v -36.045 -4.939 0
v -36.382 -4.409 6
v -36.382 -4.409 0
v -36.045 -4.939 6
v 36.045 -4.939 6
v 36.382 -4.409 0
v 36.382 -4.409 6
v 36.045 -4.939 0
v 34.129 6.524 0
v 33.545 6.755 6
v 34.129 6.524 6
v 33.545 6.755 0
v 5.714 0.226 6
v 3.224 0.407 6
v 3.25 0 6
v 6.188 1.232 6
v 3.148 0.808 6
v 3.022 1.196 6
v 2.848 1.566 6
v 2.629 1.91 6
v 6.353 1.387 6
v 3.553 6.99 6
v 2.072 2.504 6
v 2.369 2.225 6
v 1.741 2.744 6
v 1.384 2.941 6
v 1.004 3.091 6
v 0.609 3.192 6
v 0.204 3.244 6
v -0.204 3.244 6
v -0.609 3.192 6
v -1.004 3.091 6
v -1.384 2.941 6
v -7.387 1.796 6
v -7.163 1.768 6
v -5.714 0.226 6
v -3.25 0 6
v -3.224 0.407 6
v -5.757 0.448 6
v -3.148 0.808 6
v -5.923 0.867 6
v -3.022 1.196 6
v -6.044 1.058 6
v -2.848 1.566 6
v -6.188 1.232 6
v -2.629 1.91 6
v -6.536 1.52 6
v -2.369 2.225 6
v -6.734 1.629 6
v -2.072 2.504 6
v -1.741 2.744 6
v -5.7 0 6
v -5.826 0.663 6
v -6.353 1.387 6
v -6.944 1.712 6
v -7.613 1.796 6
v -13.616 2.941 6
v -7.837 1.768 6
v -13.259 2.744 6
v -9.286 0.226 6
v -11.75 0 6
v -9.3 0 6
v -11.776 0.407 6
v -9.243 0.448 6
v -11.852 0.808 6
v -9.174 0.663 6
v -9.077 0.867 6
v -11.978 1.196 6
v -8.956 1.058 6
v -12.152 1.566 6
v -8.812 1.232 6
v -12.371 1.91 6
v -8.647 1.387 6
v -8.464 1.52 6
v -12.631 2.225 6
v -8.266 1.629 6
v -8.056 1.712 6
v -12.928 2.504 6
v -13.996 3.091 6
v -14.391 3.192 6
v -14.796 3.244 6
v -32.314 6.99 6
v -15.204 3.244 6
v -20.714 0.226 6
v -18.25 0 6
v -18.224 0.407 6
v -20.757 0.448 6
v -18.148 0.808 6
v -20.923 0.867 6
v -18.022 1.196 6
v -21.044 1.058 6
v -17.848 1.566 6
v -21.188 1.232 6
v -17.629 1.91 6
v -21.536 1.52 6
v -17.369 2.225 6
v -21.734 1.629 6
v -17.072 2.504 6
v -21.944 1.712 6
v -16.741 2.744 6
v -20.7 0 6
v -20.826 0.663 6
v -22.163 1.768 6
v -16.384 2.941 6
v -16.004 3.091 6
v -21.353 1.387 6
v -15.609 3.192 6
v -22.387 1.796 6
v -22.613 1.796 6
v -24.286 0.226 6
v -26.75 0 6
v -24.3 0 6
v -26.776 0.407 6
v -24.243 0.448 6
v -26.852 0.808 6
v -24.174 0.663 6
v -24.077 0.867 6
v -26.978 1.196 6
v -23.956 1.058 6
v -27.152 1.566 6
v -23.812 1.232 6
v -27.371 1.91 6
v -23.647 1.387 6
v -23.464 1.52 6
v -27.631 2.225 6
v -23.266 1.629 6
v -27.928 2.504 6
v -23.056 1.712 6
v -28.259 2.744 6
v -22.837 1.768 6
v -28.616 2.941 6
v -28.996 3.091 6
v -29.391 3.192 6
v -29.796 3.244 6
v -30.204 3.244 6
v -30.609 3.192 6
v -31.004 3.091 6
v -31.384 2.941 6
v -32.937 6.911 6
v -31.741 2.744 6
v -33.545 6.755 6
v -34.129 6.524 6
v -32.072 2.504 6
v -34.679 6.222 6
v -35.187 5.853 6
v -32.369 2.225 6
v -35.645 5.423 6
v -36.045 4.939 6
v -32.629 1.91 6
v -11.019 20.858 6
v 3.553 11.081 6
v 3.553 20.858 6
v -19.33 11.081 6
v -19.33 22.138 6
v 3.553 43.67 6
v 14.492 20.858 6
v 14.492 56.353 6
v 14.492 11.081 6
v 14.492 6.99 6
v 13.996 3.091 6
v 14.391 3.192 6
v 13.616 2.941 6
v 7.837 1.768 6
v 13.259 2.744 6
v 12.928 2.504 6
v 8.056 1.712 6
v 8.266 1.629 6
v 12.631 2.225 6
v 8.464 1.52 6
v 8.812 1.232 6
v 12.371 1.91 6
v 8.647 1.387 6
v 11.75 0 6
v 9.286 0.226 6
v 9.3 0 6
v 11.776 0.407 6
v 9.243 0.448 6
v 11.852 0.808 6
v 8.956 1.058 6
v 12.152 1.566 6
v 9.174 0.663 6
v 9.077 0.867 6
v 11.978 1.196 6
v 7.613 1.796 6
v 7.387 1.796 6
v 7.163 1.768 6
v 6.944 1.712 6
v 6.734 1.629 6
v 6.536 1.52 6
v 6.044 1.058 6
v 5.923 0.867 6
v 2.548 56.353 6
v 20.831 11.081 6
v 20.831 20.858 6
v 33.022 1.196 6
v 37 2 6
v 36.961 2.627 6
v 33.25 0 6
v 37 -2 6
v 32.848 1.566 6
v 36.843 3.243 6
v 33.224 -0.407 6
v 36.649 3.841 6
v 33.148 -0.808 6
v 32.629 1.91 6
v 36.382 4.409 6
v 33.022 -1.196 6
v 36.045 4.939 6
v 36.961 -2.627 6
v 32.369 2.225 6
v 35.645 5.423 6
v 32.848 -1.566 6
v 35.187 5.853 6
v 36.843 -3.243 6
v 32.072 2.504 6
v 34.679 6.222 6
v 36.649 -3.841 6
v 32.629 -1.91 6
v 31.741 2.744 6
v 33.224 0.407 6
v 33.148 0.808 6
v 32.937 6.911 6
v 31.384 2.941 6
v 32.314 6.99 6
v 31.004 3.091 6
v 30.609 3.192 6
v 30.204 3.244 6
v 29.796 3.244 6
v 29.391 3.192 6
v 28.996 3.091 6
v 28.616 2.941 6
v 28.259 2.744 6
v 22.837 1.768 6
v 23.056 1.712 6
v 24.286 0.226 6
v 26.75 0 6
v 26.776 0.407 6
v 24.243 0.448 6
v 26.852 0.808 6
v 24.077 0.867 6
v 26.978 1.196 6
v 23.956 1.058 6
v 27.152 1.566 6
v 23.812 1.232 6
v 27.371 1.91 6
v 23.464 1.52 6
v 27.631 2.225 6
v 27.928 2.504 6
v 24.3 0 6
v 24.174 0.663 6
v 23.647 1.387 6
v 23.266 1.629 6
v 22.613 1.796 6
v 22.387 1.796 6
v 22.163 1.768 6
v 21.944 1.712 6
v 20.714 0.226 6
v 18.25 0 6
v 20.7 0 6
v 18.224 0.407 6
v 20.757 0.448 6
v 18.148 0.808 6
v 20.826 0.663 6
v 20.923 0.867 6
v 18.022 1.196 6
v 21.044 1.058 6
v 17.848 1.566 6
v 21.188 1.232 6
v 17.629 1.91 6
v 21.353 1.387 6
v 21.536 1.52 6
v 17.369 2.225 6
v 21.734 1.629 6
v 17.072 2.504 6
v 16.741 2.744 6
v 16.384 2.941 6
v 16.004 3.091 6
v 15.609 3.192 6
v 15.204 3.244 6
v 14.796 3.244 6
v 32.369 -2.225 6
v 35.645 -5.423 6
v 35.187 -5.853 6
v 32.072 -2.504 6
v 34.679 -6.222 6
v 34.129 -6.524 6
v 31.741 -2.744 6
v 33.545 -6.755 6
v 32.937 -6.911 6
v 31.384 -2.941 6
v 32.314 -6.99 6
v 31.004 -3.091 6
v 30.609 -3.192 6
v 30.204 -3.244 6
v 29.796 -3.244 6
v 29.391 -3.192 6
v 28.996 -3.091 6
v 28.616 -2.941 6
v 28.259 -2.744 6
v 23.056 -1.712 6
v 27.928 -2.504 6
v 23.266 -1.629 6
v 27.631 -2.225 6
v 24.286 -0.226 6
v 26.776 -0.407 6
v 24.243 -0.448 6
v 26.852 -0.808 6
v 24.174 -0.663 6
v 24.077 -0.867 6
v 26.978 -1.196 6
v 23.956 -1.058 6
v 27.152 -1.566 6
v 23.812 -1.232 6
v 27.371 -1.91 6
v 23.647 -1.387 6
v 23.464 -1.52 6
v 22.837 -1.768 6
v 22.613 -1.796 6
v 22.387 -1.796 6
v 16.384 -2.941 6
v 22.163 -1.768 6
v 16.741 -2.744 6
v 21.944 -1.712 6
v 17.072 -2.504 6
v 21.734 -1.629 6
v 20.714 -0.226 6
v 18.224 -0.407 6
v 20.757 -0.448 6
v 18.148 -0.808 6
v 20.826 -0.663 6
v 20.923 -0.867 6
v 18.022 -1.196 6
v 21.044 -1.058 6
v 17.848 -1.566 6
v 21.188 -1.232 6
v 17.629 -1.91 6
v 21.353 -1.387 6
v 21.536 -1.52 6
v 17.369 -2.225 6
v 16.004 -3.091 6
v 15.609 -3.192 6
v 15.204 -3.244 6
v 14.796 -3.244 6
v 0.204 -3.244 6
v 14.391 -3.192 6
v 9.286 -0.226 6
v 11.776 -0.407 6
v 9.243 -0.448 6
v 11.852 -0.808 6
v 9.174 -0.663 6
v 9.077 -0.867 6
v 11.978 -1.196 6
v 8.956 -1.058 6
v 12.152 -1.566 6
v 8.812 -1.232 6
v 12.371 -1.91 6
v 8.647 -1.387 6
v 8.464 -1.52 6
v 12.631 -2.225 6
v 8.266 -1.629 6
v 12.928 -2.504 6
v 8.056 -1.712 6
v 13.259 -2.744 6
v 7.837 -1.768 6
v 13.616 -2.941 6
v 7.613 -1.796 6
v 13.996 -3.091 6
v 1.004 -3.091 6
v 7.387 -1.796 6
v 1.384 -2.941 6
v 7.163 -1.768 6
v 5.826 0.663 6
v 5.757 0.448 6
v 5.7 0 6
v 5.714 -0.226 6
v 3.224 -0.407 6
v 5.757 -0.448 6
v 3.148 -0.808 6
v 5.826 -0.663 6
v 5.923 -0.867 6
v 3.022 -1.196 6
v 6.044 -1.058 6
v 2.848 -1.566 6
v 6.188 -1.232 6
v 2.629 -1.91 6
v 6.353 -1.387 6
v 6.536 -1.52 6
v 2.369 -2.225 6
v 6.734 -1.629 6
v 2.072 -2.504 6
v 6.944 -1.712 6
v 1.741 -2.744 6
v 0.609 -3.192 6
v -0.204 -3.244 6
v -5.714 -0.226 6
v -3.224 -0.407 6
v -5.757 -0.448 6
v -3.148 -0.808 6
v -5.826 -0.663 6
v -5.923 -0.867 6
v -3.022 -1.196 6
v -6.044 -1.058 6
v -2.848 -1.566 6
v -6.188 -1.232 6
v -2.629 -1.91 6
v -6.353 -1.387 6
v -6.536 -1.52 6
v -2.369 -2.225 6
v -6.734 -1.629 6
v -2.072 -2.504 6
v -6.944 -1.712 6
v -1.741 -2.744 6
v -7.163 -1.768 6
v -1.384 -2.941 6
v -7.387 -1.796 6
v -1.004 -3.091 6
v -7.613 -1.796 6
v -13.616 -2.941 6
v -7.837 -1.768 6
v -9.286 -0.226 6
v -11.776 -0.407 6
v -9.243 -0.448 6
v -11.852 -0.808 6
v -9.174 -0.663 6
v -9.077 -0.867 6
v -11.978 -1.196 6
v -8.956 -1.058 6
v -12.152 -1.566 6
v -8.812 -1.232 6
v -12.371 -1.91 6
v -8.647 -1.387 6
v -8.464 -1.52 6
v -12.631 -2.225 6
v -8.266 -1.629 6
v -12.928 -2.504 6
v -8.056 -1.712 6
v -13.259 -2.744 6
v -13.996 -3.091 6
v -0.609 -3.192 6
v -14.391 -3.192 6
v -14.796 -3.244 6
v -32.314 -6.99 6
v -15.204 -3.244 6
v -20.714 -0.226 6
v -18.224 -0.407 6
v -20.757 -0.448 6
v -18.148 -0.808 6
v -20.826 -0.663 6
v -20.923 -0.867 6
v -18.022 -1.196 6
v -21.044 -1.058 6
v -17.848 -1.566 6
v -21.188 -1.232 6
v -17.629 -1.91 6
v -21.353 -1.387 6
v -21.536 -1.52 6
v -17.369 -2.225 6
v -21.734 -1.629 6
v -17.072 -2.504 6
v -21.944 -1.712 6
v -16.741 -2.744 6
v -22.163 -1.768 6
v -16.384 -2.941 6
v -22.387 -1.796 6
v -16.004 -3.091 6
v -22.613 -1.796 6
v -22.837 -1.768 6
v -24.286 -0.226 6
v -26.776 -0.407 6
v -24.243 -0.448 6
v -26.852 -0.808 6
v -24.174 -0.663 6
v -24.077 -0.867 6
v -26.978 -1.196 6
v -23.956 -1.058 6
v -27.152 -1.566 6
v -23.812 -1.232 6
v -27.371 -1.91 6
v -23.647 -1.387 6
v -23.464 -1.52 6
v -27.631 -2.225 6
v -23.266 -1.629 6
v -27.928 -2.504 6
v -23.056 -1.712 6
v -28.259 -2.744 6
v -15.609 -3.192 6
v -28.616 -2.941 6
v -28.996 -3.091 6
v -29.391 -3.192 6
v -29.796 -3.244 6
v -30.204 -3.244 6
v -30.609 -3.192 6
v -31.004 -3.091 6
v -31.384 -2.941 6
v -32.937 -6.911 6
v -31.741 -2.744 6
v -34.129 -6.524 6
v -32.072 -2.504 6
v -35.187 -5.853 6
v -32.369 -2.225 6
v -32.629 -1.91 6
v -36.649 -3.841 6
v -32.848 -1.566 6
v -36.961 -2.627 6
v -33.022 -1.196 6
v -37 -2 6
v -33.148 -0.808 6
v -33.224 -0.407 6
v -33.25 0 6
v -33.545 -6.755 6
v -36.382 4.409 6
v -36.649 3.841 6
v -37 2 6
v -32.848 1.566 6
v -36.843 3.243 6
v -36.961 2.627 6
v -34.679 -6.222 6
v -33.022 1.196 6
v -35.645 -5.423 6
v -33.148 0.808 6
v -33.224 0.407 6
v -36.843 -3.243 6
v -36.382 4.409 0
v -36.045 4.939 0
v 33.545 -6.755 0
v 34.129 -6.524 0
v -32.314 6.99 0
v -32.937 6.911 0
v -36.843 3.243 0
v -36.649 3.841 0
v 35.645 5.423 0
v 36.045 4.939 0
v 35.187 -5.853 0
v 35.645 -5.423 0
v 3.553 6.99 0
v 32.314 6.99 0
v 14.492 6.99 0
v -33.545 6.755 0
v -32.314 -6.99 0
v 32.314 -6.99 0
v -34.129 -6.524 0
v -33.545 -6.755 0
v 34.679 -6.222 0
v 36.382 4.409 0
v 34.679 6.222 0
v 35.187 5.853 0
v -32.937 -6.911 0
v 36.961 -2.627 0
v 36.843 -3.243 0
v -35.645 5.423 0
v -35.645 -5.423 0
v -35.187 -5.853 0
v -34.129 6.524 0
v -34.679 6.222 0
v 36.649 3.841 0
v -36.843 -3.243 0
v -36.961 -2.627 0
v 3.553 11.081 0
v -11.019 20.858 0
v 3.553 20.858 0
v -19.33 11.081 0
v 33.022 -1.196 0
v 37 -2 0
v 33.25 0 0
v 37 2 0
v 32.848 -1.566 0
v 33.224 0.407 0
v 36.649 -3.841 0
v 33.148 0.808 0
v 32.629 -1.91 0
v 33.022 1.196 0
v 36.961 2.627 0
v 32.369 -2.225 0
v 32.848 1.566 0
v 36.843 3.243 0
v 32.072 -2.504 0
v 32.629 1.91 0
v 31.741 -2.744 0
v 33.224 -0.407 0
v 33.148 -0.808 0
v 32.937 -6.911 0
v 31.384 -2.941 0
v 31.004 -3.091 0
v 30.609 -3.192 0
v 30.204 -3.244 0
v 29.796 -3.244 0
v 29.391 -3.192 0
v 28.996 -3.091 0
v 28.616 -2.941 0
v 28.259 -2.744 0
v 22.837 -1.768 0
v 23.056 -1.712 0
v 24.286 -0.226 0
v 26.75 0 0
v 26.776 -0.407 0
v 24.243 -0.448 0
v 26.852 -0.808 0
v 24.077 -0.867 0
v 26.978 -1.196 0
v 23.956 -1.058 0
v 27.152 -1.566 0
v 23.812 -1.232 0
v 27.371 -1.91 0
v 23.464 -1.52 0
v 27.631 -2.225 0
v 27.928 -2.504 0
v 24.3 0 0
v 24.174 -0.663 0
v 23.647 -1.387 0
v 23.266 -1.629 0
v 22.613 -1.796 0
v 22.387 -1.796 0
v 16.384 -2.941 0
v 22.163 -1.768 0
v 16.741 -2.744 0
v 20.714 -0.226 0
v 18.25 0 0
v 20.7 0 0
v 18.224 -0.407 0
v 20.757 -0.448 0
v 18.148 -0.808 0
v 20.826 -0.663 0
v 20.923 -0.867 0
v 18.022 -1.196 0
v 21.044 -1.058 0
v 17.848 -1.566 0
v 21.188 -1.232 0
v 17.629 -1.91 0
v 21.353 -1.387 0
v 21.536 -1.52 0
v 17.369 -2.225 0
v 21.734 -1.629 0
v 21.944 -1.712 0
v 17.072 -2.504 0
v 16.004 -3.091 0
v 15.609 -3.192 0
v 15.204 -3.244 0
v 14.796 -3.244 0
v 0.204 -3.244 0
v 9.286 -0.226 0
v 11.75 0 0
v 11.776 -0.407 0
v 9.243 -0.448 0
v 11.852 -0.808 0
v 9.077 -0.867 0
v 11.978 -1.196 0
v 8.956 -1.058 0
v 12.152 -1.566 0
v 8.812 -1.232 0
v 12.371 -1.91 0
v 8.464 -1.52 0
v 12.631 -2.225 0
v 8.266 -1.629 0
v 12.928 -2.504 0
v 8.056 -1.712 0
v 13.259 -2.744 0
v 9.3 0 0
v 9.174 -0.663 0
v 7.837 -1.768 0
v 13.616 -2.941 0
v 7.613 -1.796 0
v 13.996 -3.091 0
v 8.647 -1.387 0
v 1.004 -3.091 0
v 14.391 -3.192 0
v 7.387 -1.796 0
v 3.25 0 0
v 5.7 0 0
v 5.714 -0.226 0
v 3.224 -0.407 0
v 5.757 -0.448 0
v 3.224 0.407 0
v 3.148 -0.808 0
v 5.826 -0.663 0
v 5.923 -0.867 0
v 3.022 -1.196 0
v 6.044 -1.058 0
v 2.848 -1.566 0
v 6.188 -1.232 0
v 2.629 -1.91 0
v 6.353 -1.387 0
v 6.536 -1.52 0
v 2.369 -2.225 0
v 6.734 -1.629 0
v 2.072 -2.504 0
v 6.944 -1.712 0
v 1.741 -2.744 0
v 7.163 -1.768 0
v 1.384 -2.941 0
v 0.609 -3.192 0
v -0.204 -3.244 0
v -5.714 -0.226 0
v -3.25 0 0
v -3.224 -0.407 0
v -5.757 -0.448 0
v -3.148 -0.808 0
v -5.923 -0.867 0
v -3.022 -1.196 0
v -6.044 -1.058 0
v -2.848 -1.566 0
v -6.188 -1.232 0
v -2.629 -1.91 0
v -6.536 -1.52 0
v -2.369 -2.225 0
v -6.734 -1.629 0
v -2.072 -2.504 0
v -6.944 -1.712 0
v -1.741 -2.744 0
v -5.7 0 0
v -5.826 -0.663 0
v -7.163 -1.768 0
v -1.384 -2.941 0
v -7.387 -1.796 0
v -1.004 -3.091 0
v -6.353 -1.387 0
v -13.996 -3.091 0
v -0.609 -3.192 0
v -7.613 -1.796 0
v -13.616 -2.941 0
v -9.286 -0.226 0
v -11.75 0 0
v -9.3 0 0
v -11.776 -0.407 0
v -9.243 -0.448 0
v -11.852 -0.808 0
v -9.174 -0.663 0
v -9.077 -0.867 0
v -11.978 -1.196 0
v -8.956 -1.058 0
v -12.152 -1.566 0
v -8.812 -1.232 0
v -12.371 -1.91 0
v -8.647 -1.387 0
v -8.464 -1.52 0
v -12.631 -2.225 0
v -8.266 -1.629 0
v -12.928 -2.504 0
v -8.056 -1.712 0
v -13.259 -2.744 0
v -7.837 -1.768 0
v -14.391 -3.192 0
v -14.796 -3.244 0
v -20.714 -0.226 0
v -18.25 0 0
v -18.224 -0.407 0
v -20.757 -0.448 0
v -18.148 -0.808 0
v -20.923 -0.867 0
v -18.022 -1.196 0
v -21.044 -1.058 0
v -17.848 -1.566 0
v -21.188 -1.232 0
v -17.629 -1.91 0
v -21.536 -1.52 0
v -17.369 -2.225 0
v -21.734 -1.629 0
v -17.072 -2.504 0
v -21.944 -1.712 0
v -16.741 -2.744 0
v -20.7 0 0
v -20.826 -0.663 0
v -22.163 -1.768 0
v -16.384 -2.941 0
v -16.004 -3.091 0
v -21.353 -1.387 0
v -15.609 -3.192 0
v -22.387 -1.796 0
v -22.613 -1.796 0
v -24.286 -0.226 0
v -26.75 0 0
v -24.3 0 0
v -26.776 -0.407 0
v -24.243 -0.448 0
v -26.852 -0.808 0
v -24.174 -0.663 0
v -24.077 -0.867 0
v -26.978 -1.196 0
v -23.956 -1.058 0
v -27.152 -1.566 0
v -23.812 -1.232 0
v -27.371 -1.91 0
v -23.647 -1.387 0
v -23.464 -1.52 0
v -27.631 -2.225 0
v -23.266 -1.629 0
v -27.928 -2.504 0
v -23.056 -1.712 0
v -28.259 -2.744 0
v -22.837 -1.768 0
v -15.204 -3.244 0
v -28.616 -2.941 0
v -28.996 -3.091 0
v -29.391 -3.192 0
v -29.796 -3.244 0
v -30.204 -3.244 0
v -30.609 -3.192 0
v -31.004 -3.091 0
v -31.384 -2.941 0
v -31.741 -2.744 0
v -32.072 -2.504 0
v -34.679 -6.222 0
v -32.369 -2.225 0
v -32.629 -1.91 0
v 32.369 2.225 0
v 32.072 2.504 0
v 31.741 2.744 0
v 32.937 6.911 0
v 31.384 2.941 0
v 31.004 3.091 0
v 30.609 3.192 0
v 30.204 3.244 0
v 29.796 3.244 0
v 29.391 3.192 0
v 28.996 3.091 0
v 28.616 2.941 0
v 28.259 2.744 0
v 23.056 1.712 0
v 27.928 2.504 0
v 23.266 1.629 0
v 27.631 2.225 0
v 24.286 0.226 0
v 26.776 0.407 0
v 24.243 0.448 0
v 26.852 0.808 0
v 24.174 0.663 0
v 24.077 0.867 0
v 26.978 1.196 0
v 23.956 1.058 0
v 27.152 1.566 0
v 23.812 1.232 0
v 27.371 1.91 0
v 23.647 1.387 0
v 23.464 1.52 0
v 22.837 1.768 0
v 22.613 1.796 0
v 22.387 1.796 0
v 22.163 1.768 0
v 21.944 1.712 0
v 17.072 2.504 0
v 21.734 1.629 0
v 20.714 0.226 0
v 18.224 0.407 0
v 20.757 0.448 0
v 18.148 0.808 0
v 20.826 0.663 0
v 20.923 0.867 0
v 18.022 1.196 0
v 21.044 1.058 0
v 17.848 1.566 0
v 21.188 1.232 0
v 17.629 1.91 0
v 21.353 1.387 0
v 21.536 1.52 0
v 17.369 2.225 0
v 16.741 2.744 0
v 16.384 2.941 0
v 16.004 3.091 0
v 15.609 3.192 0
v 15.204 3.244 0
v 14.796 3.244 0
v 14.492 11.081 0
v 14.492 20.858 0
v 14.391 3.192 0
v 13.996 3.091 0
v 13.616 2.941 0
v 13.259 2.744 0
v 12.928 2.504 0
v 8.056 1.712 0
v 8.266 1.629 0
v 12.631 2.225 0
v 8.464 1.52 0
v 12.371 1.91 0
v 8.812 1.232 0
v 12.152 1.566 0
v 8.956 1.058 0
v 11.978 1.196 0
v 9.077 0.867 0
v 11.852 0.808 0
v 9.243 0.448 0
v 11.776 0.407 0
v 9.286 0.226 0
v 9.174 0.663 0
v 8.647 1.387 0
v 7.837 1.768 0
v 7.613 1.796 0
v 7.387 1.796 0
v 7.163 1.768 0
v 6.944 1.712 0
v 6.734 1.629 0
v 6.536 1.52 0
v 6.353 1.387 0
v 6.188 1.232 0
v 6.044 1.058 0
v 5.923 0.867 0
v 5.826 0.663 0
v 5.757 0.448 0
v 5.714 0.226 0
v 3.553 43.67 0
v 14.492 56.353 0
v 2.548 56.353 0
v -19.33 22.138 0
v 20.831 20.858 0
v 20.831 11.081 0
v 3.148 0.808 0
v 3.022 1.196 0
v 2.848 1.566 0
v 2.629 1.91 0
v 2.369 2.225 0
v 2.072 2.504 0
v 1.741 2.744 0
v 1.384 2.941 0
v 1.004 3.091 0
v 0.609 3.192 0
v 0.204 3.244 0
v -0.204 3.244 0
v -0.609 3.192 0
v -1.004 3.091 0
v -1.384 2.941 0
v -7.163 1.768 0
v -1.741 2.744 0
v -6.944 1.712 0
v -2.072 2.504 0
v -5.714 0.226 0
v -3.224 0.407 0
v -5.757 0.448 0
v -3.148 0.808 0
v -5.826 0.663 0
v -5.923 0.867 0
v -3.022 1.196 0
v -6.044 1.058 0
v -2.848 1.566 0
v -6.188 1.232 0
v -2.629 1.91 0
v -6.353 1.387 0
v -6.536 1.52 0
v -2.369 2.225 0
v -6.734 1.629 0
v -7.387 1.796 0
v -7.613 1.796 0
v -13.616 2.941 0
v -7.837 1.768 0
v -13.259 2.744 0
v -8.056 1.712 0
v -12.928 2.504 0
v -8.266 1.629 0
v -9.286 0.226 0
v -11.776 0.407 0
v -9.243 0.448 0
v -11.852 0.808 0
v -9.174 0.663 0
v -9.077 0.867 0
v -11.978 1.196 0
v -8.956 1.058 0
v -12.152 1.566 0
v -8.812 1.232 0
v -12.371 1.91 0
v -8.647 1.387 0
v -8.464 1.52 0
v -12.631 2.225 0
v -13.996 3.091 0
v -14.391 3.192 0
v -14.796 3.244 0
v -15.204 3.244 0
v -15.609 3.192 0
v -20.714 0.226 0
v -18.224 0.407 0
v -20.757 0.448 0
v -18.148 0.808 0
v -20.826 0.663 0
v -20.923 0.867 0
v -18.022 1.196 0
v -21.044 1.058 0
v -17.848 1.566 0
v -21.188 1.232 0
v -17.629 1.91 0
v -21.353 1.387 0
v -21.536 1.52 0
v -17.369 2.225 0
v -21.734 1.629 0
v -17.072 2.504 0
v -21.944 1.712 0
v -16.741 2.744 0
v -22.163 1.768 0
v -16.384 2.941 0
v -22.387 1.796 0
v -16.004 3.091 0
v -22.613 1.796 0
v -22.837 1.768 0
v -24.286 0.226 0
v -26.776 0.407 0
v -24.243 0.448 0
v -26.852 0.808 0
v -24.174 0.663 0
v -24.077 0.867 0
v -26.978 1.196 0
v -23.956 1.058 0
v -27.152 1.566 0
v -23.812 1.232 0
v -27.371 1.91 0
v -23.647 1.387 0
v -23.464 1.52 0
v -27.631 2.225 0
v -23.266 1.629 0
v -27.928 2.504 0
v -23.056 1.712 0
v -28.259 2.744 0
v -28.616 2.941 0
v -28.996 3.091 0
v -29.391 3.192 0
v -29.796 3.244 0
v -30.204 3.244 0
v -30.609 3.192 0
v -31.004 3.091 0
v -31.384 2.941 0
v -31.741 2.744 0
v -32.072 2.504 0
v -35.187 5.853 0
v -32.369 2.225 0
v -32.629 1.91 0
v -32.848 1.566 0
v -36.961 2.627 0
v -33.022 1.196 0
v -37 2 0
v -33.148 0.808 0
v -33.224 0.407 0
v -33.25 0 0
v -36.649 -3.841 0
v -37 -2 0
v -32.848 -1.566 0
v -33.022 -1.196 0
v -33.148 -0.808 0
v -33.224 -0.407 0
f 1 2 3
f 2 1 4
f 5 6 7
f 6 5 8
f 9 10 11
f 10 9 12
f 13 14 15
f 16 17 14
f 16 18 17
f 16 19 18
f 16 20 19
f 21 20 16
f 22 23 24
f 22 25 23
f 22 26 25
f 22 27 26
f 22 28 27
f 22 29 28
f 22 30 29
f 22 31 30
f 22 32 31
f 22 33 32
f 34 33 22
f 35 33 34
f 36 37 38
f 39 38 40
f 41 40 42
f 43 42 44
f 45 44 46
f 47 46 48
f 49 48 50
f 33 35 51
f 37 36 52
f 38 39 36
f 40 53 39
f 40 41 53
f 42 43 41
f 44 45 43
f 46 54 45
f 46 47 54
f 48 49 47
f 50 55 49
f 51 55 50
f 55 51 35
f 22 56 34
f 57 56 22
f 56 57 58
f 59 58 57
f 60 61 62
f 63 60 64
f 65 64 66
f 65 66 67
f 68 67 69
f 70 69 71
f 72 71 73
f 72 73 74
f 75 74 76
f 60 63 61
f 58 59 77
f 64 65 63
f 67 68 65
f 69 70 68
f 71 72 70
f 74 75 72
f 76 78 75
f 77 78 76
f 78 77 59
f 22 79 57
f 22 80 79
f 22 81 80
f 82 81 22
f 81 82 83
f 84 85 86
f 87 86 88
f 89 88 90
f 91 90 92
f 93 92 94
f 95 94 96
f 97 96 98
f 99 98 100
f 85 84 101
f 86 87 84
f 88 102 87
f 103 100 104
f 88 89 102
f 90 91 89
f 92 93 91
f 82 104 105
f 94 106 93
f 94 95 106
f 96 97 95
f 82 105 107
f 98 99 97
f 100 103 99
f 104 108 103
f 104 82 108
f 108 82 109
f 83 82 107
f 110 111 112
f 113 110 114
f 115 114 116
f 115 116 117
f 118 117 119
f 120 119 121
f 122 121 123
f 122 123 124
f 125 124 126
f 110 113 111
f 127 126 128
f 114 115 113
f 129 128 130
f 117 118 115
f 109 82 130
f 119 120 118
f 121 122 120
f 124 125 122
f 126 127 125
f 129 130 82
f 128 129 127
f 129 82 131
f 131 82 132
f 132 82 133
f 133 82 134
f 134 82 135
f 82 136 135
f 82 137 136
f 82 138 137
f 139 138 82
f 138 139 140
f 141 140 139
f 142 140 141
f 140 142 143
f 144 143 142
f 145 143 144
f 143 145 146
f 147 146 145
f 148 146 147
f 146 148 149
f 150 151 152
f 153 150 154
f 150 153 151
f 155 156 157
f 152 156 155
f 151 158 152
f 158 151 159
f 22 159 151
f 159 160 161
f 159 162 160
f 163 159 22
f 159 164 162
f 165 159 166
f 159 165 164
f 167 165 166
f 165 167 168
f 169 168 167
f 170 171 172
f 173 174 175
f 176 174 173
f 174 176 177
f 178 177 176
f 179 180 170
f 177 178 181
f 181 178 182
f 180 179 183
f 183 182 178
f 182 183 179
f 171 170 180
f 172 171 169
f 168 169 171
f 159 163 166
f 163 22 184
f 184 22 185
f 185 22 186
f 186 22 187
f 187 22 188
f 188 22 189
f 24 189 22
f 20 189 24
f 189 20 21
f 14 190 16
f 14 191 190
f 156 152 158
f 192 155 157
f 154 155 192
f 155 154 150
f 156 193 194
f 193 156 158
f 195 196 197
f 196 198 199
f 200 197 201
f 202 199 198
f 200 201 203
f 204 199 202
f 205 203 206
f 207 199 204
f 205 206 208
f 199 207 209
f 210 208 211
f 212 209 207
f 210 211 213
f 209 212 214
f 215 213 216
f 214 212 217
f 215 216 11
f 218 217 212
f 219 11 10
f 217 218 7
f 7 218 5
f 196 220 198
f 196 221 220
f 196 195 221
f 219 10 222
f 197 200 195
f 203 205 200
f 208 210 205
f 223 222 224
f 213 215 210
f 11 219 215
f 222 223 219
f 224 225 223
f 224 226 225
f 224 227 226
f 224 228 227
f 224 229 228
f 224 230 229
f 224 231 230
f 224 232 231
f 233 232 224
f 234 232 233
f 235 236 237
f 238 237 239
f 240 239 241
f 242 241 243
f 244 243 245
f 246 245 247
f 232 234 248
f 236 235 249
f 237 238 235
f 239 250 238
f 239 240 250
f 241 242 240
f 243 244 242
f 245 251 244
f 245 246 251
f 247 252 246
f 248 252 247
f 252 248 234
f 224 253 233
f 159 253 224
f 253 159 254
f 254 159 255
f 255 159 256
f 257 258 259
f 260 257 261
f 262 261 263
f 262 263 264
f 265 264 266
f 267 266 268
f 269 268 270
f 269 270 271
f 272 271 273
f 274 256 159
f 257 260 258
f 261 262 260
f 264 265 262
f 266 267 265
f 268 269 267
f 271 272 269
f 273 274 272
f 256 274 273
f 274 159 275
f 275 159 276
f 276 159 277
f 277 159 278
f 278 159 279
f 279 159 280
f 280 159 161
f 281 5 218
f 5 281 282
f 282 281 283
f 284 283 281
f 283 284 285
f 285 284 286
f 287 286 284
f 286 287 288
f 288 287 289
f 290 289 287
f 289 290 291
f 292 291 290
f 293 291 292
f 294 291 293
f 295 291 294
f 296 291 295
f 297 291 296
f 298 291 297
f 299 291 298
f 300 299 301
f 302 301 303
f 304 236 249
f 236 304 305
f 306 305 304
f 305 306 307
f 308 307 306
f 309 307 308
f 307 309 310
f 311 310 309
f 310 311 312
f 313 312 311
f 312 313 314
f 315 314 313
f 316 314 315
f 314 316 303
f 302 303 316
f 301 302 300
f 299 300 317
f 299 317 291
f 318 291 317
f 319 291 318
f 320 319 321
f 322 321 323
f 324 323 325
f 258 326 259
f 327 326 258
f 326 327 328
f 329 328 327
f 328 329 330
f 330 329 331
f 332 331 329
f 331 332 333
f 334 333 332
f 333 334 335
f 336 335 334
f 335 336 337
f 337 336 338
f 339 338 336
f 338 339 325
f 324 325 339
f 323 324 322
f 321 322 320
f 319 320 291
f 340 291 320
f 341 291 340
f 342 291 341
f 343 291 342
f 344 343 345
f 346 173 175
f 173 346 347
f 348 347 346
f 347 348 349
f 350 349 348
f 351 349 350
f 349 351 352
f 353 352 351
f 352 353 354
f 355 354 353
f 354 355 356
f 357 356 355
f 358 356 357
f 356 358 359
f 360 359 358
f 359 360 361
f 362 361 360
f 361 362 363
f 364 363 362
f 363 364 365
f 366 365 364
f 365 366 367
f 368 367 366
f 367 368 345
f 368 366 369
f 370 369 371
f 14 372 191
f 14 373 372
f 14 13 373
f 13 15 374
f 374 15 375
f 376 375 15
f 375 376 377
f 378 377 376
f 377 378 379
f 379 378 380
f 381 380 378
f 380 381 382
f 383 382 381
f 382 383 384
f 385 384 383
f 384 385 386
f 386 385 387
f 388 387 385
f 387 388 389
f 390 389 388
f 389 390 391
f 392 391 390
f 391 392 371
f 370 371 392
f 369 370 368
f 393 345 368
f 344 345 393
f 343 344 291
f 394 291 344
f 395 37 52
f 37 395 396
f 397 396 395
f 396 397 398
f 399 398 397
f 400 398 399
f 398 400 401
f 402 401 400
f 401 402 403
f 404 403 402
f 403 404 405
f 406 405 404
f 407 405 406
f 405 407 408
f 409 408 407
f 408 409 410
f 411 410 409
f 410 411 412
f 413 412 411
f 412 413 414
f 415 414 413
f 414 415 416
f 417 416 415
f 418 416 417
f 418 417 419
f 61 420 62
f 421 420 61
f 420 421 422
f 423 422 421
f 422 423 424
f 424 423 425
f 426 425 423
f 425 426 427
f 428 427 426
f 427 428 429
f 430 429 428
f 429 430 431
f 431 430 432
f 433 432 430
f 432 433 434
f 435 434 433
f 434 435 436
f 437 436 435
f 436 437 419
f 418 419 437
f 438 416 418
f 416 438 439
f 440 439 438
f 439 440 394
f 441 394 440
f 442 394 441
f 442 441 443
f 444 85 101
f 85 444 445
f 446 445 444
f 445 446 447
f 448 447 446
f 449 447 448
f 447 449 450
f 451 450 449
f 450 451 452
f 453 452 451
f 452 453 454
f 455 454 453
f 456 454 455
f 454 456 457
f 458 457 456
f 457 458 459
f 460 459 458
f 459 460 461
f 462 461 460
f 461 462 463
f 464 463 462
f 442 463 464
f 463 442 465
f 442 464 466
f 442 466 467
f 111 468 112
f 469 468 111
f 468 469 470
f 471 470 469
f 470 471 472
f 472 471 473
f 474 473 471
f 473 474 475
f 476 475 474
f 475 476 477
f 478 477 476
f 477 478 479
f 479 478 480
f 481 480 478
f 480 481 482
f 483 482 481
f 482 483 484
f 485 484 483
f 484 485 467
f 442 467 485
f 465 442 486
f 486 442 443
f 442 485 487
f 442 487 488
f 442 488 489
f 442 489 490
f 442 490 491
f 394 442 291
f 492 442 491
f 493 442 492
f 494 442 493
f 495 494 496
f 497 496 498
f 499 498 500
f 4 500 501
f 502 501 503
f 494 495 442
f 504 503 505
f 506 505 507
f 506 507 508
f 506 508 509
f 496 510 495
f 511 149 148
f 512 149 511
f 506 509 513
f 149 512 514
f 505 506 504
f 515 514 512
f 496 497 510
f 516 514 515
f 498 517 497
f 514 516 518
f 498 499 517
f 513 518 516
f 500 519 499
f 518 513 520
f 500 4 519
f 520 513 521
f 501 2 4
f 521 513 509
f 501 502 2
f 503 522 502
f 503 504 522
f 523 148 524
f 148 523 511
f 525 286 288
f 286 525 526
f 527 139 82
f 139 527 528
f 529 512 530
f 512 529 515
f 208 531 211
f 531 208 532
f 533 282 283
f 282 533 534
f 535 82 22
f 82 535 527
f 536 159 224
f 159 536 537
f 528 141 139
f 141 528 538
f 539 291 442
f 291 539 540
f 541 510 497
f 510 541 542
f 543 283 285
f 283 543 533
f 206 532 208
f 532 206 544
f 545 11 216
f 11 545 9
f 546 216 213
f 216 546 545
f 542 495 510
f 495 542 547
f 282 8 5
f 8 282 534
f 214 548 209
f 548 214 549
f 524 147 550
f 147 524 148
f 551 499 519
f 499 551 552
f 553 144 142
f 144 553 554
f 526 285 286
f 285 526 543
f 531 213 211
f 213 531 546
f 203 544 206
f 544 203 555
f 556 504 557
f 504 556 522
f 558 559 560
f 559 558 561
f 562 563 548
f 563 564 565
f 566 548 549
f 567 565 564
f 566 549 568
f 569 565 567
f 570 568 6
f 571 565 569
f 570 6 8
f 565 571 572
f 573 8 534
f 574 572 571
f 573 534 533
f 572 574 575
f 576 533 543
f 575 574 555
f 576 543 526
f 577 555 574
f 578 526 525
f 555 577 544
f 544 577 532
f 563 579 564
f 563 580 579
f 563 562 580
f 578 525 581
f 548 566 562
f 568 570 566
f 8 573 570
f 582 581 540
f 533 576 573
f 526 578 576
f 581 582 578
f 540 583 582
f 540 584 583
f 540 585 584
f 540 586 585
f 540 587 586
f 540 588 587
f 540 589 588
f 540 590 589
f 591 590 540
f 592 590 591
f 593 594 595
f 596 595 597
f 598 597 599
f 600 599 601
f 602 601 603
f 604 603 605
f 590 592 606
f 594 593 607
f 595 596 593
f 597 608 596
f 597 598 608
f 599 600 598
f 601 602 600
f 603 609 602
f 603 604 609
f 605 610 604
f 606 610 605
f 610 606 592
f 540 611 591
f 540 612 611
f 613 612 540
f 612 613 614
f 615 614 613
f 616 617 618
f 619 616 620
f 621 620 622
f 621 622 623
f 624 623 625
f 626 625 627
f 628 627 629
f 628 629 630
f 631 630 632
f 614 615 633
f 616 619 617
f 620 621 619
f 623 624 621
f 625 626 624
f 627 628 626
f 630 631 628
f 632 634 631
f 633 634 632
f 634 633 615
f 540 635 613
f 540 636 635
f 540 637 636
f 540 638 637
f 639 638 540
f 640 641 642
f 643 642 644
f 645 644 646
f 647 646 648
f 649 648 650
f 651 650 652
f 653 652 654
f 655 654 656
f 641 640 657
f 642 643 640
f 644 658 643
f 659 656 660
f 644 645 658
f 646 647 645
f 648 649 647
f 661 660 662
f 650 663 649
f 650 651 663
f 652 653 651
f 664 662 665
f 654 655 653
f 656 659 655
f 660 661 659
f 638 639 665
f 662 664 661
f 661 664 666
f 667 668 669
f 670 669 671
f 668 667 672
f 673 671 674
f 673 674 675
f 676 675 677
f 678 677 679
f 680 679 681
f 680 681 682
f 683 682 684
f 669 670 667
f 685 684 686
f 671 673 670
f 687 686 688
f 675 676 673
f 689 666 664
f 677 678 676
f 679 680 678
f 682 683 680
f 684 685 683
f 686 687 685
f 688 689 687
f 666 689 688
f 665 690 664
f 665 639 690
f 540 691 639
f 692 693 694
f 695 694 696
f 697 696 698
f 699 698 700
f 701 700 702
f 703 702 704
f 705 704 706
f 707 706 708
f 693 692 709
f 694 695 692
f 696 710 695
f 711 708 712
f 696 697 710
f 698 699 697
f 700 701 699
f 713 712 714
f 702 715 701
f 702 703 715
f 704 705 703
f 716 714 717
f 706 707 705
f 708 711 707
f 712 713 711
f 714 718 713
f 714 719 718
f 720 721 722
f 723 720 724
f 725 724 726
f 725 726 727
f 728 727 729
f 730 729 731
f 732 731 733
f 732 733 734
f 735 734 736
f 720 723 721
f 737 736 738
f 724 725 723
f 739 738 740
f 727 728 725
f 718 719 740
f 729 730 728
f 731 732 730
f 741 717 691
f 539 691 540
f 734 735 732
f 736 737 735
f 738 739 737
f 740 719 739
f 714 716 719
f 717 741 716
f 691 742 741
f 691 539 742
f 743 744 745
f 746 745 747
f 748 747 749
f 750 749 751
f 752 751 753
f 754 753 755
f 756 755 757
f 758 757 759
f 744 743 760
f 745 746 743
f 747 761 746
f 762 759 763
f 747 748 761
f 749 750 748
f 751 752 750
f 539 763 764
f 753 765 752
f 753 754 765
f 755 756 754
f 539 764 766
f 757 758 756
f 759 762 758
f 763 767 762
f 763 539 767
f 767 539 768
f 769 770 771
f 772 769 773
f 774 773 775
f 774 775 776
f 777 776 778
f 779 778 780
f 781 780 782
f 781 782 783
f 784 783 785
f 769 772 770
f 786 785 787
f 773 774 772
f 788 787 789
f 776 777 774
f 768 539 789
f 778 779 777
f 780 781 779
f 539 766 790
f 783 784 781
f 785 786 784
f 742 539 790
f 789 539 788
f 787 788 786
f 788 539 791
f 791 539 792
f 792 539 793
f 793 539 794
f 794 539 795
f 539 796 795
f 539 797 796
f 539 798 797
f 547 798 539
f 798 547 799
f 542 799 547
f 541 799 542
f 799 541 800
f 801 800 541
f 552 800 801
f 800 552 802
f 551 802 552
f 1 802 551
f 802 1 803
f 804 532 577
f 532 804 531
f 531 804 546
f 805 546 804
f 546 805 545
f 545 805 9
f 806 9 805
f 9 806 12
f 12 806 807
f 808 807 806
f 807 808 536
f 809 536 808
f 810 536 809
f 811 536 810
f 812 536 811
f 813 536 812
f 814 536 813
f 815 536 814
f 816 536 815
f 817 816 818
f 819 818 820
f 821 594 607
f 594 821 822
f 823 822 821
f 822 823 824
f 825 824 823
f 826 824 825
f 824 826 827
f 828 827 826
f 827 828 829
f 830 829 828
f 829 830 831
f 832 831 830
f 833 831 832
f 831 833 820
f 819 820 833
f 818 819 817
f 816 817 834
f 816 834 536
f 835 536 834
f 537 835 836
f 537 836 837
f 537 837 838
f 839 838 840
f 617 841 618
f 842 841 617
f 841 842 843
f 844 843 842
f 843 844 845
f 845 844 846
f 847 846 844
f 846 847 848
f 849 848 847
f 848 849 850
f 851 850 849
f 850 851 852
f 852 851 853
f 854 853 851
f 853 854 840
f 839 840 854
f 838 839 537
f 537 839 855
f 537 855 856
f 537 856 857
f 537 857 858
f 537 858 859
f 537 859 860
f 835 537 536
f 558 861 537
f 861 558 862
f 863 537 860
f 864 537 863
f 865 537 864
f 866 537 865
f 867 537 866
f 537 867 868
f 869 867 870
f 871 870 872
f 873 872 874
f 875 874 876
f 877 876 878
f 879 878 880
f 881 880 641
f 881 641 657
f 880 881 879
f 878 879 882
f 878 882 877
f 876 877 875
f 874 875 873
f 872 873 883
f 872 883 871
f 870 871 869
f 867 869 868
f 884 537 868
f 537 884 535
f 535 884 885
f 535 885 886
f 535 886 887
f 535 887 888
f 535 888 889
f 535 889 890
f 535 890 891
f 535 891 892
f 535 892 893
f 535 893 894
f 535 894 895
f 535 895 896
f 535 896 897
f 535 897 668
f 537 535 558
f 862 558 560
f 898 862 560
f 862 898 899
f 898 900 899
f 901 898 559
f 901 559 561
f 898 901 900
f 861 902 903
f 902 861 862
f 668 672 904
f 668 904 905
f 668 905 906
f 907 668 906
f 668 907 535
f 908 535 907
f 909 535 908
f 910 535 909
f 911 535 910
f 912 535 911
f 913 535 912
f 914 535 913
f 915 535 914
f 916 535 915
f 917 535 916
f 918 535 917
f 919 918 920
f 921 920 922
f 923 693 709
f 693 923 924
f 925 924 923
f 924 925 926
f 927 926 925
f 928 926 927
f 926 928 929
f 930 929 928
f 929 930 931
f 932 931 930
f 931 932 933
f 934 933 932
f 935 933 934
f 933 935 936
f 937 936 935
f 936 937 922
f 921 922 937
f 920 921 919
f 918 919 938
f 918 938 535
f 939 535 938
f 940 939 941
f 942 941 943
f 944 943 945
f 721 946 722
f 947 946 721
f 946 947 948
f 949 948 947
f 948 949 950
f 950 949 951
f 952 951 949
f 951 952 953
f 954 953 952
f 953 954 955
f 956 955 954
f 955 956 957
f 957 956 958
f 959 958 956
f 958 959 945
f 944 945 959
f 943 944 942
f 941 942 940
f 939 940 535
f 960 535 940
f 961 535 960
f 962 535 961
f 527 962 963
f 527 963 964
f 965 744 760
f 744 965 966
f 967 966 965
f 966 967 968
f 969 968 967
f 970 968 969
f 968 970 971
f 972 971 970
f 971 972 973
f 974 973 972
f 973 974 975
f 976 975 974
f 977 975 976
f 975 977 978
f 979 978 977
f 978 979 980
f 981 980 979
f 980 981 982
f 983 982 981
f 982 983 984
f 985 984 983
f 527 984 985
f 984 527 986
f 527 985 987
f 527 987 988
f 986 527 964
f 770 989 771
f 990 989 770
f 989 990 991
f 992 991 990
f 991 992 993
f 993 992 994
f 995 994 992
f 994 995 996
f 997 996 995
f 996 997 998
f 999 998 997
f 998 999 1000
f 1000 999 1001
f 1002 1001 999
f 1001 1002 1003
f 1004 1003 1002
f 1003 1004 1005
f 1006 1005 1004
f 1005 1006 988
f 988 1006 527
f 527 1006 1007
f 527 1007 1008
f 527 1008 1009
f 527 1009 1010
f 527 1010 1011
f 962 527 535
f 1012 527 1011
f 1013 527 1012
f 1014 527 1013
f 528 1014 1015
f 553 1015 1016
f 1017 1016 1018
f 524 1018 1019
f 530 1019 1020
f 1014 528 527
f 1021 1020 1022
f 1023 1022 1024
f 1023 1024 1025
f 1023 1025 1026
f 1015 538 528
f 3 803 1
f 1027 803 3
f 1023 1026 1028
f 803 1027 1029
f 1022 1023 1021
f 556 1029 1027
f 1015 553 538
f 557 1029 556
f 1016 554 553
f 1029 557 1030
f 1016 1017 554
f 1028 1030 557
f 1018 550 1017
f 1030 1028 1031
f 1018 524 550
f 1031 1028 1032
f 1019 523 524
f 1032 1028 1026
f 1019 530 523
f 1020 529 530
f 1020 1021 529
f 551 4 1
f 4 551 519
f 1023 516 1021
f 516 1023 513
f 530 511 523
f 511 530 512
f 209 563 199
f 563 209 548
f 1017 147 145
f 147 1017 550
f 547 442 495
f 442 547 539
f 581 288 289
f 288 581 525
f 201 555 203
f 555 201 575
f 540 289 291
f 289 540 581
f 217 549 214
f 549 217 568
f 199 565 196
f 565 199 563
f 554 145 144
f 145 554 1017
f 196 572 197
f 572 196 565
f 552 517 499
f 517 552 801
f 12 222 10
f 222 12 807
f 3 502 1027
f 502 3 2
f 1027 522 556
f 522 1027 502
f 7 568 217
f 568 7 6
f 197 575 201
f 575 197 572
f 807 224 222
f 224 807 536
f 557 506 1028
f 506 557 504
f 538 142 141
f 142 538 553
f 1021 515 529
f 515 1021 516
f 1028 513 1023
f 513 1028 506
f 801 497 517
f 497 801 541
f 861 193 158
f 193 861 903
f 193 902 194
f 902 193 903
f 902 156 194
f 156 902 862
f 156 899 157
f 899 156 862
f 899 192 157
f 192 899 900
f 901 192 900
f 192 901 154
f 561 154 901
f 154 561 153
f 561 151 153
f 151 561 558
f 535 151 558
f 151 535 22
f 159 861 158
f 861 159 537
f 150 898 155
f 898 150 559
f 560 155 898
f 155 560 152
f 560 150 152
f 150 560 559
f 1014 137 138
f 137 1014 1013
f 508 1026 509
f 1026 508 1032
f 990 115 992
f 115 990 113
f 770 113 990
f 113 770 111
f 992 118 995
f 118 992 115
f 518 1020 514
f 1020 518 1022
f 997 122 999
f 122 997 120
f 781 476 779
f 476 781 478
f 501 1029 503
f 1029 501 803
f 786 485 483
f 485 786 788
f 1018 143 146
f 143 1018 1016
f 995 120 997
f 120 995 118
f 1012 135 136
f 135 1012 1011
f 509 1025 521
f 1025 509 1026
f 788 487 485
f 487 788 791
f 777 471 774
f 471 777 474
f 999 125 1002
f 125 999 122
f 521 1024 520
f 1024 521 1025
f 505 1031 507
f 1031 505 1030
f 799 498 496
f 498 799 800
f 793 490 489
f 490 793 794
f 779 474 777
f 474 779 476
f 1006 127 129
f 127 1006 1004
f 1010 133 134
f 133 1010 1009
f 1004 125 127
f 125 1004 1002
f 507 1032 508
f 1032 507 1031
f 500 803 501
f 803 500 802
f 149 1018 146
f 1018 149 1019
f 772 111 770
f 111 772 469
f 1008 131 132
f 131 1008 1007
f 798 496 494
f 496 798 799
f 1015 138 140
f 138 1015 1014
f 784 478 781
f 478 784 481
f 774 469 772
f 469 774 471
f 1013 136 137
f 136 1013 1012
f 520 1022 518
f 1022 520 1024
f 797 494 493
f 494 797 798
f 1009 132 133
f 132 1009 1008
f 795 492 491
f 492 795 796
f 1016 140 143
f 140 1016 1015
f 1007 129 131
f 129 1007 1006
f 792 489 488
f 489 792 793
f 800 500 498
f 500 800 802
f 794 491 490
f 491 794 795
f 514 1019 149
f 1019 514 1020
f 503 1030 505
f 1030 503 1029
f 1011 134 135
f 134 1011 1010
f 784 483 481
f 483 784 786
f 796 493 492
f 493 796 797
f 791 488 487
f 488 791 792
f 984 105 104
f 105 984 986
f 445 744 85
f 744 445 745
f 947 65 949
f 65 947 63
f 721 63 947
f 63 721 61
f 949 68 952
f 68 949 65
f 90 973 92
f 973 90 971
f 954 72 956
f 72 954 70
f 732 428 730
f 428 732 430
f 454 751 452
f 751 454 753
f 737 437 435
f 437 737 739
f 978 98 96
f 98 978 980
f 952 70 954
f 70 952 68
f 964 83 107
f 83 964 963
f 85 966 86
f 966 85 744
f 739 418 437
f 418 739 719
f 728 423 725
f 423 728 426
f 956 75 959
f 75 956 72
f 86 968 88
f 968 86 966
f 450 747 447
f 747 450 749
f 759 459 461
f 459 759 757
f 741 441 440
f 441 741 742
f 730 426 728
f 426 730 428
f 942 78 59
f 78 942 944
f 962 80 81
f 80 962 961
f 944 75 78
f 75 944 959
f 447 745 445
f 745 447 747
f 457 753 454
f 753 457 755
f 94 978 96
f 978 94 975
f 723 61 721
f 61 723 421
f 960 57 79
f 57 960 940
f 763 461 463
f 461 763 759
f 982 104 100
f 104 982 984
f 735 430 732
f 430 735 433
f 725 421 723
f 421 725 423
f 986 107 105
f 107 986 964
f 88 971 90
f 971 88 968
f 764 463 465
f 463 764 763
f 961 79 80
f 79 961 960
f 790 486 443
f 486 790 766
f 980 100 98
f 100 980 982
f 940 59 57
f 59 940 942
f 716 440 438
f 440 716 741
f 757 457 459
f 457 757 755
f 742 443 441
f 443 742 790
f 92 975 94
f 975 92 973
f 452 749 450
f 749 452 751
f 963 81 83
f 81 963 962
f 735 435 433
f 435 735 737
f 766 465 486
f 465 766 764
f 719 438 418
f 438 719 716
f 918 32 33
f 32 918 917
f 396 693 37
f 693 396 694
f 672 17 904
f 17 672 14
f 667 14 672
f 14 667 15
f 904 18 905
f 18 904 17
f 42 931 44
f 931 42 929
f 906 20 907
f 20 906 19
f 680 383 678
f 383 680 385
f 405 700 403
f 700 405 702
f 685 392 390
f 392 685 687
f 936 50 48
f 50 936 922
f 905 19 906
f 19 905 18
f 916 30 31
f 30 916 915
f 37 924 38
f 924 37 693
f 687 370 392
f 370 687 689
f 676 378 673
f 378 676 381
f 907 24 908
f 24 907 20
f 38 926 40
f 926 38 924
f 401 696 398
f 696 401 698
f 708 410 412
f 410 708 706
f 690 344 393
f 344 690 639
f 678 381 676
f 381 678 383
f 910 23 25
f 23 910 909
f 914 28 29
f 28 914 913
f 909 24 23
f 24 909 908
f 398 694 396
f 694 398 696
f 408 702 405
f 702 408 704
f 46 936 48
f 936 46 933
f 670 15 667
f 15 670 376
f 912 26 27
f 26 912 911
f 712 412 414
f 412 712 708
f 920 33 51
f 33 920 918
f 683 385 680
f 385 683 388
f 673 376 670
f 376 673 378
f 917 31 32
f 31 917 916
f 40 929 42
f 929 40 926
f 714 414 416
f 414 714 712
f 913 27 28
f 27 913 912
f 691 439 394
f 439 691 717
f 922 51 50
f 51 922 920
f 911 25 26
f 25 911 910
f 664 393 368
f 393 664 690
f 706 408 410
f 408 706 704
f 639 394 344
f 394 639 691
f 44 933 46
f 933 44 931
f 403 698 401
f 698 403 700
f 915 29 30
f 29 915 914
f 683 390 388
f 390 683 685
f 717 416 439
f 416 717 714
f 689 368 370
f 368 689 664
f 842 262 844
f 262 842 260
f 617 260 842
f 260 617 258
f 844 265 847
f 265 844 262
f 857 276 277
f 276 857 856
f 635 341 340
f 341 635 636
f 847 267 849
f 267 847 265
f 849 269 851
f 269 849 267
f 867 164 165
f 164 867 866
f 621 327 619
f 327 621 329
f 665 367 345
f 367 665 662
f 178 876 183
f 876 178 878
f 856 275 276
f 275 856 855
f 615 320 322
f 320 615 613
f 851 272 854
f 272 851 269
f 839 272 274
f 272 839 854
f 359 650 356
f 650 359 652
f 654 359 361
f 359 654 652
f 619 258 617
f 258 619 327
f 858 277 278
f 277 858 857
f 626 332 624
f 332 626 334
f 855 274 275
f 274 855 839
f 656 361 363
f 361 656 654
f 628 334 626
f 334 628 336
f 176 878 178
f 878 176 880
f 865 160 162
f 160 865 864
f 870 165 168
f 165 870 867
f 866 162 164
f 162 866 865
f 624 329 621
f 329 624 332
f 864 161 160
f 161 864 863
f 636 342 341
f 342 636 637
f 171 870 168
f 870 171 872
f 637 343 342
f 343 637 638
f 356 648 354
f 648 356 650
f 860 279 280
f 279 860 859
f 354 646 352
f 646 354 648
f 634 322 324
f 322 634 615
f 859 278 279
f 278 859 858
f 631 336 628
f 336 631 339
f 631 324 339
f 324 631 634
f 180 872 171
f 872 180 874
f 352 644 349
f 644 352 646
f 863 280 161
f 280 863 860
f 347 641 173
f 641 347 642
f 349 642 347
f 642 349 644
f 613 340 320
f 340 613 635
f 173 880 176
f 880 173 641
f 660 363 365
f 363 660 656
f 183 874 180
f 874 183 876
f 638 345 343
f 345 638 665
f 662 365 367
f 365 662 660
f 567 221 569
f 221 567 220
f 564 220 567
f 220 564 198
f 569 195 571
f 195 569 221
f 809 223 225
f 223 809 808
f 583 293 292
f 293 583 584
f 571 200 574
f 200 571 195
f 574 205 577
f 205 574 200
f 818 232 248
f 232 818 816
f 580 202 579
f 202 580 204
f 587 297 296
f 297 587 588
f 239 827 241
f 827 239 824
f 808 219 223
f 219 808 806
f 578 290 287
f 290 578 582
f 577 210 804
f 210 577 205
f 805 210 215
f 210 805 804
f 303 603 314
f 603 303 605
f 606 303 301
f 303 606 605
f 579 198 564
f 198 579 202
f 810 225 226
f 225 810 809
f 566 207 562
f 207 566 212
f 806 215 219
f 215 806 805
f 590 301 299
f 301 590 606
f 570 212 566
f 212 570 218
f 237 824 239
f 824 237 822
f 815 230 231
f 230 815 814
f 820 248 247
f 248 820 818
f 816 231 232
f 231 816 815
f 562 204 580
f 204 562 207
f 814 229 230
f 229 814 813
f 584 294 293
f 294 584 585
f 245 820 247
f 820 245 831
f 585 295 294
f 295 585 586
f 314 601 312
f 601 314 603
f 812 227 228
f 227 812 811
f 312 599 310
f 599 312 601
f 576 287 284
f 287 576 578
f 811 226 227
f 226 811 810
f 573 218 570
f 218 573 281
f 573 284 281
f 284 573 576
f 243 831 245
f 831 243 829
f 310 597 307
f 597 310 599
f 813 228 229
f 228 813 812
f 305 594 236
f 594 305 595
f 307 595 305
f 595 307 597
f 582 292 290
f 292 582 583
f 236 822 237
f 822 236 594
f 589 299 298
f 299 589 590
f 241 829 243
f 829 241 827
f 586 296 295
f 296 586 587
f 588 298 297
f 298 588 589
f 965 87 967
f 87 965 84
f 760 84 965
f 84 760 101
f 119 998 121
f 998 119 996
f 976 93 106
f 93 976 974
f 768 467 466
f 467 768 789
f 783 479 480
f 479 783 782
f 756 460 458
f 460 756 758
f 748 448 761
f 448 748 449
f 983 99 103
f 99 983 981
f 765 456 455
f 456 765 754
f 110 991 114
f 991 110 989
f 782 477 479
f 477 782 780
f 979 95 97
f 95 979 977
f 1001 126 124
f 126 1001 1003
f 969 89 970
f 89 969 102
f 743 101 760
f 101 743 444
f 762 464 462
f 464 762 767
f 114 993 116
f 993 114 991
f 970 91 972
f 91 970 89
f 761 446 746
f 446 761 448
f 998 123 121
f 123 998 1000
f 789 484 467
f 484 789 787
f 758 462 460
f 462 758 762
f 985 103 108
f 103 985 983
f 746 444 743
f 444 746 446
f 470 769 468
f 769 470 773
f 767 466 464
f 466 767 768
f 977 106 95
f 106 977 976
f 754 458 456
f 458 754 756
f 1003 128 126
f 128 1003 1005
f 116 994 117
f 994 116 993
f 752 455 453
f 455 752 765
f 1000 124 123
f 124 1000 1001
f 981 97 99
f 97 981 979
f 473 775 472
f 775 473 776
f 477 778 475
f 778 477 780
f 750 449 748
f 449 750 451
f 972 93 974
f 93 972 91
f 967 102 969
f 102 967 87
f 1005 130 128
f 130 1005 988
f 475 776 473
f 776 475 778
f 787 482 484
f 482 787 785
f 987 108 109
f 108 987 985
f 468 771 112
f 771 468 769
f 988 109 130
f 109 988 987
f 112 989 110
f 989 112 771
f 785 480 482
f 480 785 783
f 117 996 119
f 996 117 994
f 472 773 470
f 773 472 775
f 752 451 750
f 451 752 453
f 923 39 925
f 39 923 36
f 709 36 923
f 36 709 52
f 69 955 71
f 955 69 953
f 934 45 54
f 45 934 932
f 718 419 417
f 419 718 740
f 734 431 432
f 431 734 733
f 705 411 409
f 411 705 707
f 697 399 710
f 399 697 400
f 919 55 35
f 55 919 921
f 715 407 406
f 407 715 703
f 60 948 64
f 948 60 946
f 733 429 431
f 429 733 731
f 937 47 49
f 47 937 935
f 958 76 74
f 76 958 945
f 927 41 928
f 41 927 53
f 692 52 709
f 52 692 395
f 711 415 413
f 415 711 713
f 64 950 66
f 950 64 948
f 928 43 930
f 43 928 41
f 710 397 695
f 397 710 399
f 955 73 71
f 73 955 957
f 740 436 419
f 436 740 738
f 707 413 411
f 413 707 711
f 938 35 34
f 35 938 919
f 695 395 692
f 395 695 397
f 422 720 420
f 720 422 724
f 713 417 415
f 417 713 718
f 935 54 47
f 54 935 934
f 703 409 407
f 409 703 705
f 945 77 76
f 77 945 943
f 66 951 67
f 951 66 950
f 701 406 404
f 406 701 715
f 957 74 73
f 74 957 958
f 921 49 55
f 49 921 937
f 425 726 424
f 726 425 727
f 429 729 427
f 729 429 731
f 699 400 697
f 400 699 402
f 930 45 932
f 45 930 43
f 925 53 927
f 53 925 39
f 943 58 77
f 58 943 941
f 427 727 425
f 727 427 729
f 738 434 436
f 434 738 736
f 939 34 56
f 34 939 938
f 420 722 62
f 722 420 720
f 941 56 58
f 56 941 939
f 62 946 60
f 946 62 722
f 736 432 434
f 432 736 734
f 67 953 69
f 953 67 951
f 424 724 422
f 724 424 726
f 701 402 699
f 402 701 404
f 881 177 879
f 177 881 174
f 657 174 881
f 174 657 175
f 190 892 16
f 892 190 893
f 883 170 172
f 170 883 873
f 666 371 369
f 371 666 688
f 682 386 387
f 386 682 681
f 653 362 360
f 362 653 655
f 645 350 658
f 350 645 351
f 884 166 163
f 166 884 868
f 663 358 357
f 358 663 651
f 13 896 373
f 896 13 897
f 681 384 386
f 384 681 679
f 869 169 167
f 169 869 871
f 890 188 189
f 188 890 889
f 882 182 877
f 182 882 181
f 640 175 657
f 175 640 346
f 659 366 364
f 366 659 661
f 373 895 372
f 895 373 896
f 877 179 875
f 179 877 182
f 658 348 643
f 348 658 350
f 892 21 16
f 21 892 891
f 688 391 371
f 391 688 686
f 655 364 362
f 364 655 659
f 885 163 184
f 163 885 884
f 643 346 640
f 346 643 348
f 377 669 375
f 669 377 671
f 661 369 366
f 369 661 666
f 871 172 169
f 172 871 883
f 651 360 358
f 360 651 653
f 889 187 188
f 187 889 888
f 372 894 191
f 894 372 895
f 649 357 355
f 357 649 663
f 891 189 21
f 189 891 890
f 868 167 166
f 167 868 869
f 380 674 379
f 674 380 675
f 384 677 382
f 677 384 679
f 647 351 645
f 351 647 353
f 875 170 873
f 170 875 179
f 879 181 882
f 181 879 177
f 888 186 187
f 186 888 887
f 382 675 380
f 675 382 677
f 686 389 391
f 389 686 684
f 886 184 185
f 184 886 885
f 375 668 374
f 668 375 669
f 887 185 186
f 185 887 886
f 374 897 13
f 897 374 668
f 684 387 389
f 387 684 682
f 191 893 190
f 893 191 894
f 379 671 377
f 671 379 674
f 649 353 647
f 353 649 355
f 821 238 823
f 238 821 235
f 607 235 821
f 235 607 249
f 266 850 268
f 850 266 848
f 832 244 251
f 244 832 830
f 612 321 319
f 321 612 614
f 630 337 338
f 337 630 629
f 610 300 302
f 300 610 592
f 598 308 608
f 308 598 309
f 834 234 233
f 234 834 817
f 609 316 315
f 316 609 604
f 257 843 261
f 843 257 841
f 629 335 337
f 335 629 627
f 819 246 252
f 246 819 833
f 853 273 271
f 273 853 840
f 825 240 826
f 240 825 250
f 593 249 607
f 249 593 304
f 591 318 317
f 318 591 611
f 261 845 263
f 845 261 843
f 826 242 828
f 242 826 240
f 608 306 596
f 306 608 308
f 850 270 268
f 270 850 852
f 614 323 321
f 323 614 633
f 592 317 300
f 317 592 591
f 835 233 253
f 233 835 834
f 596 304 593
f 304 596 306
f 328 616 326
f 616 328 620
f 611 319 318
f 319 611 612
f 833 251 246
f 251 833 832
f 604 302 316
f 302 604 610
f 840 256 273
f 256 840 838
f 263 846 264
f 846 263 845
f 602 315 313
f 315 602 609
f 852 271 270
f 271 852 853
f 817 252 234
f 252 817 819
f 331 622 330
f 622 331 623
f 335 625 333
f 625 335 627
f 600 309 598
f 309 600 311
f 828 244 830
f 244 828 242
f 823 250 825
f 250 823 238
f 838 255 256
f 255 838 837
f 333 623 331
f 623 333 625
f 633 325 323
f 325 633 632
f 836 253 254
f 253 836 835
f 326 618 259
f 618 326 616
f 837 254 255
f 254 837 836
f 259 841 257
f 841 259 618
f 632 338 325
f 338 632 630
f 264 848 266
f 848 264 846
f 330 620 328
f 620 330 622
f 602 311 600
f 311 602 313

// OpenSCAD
$fn = 50;


difference() {
	union() {
		hull() {
			translate(v = [-32.0000000000, 2.0000000000, 0]) {
				cylinder(h = 6, r = 5);
			}
			translate(v = [32.0000000000, 2.0000000000, 0]) {
				cylinder(h = 6, r = 5);
			}
			translate(v = [-32.0000000000, -2.0000000000, 0]) {
				cylinder(h = 6, r = 5);
			}
			translate(v = [32.0000000000, -2.0000000000, 0]) {
				cylinder(h = 6, r = 5);
			}
		}
		translate(v = [0, 55, 0]) {
			linear_extrude(height = 6) {
				text(font = "DejaVu Sans Mono:style=Bold", halign = "center", size = 57.0000000000, text = "4", valign = "top");
			}
		}
	}
	union() {
		translate(v = [-30.0000000000, 0.0000000000, 0]) {
			translate(v = [0, 0, -100]) {
				cylinder(h = 200, r = 3.2500000000);
			}
		}
		translate(v = [-15.0000000000, 0.0000000000, 0]) {
			translate(v = [0, 0, -100]) {
				cylinder(h = 200, r = 3.2500000000);
			}
		}
		translate(v = [0, 0, -100]) {
			cylinder(h = 200, r = 3.2500000000);
		}
		translate(v = [15.0000000000, 0.0000000000, 0]) {
			translate(v = [0, 0, -100]) {
				cylinder(h = 200, r = 3.2500000000);
			}
		}
		translate(v = [30.0000000000, 0.0000000000, 0]) {
			translate(v = [0, 0, -100]) {
				cylinder(h = 200, r = 3.2500000000);
			}
		}
		translate(v = [-30.0000000000, 0.0000000000, 0]) {
			translate(v = [0, 0, -100]) {
				cylinder(h = 200, r = 1.8000000000);
			}
		}
		translate(v = [-22.5000000000, 0.0000000000, 0]) {
			translate(v = [0, 0, -100]) {
				cylinder(h = 200, r = 1.8000000000);
			}
		}
		translate(v = [-15.0000000000, 0.0000000000, 0]) {
			translate(v = [0, 0, -100]) {
				cylinder(h = 200, r = 1.8000000000);
			}
		}
		translate(v = [-7.5000000000, 0.0000000000, 0]) {
			translate(v = [0, 0, -100]) {
				cylinder(h = 200, r = 1.8000000000);
			}
		}
		translate(v = [0, 0, -100]) {
			cylinder(h = 200, r = 1.8000000000);
		}
		translate(v = [7.5000000000, 0.0000000000, 0]) {
			translate(v = [0, 0, -100]) {
				cylinder(h = 200, r = 1.8000000000);
			}
		}
		translate(v = [15.0000000000, 0.0000000000, 0]) {
			translate(v = [0, 0, -100]) {
				cylinder(h = 200, r = 1.8000000000);
			}
		}
		translate(v = [22.5000000000, 0.0000000000, 0]) {
			translate(v = [0, 0, -100]) {
				cylinder(h = 200, r = 1.8000000000);
			}
		}
		translate(v = [30.0000000000, 0.0000000000, 0]) {
			translate(v = [0, 0, -100]) {
				cylinder(h = 200, r = 1.8000000000);
			}
		}
	}
}
